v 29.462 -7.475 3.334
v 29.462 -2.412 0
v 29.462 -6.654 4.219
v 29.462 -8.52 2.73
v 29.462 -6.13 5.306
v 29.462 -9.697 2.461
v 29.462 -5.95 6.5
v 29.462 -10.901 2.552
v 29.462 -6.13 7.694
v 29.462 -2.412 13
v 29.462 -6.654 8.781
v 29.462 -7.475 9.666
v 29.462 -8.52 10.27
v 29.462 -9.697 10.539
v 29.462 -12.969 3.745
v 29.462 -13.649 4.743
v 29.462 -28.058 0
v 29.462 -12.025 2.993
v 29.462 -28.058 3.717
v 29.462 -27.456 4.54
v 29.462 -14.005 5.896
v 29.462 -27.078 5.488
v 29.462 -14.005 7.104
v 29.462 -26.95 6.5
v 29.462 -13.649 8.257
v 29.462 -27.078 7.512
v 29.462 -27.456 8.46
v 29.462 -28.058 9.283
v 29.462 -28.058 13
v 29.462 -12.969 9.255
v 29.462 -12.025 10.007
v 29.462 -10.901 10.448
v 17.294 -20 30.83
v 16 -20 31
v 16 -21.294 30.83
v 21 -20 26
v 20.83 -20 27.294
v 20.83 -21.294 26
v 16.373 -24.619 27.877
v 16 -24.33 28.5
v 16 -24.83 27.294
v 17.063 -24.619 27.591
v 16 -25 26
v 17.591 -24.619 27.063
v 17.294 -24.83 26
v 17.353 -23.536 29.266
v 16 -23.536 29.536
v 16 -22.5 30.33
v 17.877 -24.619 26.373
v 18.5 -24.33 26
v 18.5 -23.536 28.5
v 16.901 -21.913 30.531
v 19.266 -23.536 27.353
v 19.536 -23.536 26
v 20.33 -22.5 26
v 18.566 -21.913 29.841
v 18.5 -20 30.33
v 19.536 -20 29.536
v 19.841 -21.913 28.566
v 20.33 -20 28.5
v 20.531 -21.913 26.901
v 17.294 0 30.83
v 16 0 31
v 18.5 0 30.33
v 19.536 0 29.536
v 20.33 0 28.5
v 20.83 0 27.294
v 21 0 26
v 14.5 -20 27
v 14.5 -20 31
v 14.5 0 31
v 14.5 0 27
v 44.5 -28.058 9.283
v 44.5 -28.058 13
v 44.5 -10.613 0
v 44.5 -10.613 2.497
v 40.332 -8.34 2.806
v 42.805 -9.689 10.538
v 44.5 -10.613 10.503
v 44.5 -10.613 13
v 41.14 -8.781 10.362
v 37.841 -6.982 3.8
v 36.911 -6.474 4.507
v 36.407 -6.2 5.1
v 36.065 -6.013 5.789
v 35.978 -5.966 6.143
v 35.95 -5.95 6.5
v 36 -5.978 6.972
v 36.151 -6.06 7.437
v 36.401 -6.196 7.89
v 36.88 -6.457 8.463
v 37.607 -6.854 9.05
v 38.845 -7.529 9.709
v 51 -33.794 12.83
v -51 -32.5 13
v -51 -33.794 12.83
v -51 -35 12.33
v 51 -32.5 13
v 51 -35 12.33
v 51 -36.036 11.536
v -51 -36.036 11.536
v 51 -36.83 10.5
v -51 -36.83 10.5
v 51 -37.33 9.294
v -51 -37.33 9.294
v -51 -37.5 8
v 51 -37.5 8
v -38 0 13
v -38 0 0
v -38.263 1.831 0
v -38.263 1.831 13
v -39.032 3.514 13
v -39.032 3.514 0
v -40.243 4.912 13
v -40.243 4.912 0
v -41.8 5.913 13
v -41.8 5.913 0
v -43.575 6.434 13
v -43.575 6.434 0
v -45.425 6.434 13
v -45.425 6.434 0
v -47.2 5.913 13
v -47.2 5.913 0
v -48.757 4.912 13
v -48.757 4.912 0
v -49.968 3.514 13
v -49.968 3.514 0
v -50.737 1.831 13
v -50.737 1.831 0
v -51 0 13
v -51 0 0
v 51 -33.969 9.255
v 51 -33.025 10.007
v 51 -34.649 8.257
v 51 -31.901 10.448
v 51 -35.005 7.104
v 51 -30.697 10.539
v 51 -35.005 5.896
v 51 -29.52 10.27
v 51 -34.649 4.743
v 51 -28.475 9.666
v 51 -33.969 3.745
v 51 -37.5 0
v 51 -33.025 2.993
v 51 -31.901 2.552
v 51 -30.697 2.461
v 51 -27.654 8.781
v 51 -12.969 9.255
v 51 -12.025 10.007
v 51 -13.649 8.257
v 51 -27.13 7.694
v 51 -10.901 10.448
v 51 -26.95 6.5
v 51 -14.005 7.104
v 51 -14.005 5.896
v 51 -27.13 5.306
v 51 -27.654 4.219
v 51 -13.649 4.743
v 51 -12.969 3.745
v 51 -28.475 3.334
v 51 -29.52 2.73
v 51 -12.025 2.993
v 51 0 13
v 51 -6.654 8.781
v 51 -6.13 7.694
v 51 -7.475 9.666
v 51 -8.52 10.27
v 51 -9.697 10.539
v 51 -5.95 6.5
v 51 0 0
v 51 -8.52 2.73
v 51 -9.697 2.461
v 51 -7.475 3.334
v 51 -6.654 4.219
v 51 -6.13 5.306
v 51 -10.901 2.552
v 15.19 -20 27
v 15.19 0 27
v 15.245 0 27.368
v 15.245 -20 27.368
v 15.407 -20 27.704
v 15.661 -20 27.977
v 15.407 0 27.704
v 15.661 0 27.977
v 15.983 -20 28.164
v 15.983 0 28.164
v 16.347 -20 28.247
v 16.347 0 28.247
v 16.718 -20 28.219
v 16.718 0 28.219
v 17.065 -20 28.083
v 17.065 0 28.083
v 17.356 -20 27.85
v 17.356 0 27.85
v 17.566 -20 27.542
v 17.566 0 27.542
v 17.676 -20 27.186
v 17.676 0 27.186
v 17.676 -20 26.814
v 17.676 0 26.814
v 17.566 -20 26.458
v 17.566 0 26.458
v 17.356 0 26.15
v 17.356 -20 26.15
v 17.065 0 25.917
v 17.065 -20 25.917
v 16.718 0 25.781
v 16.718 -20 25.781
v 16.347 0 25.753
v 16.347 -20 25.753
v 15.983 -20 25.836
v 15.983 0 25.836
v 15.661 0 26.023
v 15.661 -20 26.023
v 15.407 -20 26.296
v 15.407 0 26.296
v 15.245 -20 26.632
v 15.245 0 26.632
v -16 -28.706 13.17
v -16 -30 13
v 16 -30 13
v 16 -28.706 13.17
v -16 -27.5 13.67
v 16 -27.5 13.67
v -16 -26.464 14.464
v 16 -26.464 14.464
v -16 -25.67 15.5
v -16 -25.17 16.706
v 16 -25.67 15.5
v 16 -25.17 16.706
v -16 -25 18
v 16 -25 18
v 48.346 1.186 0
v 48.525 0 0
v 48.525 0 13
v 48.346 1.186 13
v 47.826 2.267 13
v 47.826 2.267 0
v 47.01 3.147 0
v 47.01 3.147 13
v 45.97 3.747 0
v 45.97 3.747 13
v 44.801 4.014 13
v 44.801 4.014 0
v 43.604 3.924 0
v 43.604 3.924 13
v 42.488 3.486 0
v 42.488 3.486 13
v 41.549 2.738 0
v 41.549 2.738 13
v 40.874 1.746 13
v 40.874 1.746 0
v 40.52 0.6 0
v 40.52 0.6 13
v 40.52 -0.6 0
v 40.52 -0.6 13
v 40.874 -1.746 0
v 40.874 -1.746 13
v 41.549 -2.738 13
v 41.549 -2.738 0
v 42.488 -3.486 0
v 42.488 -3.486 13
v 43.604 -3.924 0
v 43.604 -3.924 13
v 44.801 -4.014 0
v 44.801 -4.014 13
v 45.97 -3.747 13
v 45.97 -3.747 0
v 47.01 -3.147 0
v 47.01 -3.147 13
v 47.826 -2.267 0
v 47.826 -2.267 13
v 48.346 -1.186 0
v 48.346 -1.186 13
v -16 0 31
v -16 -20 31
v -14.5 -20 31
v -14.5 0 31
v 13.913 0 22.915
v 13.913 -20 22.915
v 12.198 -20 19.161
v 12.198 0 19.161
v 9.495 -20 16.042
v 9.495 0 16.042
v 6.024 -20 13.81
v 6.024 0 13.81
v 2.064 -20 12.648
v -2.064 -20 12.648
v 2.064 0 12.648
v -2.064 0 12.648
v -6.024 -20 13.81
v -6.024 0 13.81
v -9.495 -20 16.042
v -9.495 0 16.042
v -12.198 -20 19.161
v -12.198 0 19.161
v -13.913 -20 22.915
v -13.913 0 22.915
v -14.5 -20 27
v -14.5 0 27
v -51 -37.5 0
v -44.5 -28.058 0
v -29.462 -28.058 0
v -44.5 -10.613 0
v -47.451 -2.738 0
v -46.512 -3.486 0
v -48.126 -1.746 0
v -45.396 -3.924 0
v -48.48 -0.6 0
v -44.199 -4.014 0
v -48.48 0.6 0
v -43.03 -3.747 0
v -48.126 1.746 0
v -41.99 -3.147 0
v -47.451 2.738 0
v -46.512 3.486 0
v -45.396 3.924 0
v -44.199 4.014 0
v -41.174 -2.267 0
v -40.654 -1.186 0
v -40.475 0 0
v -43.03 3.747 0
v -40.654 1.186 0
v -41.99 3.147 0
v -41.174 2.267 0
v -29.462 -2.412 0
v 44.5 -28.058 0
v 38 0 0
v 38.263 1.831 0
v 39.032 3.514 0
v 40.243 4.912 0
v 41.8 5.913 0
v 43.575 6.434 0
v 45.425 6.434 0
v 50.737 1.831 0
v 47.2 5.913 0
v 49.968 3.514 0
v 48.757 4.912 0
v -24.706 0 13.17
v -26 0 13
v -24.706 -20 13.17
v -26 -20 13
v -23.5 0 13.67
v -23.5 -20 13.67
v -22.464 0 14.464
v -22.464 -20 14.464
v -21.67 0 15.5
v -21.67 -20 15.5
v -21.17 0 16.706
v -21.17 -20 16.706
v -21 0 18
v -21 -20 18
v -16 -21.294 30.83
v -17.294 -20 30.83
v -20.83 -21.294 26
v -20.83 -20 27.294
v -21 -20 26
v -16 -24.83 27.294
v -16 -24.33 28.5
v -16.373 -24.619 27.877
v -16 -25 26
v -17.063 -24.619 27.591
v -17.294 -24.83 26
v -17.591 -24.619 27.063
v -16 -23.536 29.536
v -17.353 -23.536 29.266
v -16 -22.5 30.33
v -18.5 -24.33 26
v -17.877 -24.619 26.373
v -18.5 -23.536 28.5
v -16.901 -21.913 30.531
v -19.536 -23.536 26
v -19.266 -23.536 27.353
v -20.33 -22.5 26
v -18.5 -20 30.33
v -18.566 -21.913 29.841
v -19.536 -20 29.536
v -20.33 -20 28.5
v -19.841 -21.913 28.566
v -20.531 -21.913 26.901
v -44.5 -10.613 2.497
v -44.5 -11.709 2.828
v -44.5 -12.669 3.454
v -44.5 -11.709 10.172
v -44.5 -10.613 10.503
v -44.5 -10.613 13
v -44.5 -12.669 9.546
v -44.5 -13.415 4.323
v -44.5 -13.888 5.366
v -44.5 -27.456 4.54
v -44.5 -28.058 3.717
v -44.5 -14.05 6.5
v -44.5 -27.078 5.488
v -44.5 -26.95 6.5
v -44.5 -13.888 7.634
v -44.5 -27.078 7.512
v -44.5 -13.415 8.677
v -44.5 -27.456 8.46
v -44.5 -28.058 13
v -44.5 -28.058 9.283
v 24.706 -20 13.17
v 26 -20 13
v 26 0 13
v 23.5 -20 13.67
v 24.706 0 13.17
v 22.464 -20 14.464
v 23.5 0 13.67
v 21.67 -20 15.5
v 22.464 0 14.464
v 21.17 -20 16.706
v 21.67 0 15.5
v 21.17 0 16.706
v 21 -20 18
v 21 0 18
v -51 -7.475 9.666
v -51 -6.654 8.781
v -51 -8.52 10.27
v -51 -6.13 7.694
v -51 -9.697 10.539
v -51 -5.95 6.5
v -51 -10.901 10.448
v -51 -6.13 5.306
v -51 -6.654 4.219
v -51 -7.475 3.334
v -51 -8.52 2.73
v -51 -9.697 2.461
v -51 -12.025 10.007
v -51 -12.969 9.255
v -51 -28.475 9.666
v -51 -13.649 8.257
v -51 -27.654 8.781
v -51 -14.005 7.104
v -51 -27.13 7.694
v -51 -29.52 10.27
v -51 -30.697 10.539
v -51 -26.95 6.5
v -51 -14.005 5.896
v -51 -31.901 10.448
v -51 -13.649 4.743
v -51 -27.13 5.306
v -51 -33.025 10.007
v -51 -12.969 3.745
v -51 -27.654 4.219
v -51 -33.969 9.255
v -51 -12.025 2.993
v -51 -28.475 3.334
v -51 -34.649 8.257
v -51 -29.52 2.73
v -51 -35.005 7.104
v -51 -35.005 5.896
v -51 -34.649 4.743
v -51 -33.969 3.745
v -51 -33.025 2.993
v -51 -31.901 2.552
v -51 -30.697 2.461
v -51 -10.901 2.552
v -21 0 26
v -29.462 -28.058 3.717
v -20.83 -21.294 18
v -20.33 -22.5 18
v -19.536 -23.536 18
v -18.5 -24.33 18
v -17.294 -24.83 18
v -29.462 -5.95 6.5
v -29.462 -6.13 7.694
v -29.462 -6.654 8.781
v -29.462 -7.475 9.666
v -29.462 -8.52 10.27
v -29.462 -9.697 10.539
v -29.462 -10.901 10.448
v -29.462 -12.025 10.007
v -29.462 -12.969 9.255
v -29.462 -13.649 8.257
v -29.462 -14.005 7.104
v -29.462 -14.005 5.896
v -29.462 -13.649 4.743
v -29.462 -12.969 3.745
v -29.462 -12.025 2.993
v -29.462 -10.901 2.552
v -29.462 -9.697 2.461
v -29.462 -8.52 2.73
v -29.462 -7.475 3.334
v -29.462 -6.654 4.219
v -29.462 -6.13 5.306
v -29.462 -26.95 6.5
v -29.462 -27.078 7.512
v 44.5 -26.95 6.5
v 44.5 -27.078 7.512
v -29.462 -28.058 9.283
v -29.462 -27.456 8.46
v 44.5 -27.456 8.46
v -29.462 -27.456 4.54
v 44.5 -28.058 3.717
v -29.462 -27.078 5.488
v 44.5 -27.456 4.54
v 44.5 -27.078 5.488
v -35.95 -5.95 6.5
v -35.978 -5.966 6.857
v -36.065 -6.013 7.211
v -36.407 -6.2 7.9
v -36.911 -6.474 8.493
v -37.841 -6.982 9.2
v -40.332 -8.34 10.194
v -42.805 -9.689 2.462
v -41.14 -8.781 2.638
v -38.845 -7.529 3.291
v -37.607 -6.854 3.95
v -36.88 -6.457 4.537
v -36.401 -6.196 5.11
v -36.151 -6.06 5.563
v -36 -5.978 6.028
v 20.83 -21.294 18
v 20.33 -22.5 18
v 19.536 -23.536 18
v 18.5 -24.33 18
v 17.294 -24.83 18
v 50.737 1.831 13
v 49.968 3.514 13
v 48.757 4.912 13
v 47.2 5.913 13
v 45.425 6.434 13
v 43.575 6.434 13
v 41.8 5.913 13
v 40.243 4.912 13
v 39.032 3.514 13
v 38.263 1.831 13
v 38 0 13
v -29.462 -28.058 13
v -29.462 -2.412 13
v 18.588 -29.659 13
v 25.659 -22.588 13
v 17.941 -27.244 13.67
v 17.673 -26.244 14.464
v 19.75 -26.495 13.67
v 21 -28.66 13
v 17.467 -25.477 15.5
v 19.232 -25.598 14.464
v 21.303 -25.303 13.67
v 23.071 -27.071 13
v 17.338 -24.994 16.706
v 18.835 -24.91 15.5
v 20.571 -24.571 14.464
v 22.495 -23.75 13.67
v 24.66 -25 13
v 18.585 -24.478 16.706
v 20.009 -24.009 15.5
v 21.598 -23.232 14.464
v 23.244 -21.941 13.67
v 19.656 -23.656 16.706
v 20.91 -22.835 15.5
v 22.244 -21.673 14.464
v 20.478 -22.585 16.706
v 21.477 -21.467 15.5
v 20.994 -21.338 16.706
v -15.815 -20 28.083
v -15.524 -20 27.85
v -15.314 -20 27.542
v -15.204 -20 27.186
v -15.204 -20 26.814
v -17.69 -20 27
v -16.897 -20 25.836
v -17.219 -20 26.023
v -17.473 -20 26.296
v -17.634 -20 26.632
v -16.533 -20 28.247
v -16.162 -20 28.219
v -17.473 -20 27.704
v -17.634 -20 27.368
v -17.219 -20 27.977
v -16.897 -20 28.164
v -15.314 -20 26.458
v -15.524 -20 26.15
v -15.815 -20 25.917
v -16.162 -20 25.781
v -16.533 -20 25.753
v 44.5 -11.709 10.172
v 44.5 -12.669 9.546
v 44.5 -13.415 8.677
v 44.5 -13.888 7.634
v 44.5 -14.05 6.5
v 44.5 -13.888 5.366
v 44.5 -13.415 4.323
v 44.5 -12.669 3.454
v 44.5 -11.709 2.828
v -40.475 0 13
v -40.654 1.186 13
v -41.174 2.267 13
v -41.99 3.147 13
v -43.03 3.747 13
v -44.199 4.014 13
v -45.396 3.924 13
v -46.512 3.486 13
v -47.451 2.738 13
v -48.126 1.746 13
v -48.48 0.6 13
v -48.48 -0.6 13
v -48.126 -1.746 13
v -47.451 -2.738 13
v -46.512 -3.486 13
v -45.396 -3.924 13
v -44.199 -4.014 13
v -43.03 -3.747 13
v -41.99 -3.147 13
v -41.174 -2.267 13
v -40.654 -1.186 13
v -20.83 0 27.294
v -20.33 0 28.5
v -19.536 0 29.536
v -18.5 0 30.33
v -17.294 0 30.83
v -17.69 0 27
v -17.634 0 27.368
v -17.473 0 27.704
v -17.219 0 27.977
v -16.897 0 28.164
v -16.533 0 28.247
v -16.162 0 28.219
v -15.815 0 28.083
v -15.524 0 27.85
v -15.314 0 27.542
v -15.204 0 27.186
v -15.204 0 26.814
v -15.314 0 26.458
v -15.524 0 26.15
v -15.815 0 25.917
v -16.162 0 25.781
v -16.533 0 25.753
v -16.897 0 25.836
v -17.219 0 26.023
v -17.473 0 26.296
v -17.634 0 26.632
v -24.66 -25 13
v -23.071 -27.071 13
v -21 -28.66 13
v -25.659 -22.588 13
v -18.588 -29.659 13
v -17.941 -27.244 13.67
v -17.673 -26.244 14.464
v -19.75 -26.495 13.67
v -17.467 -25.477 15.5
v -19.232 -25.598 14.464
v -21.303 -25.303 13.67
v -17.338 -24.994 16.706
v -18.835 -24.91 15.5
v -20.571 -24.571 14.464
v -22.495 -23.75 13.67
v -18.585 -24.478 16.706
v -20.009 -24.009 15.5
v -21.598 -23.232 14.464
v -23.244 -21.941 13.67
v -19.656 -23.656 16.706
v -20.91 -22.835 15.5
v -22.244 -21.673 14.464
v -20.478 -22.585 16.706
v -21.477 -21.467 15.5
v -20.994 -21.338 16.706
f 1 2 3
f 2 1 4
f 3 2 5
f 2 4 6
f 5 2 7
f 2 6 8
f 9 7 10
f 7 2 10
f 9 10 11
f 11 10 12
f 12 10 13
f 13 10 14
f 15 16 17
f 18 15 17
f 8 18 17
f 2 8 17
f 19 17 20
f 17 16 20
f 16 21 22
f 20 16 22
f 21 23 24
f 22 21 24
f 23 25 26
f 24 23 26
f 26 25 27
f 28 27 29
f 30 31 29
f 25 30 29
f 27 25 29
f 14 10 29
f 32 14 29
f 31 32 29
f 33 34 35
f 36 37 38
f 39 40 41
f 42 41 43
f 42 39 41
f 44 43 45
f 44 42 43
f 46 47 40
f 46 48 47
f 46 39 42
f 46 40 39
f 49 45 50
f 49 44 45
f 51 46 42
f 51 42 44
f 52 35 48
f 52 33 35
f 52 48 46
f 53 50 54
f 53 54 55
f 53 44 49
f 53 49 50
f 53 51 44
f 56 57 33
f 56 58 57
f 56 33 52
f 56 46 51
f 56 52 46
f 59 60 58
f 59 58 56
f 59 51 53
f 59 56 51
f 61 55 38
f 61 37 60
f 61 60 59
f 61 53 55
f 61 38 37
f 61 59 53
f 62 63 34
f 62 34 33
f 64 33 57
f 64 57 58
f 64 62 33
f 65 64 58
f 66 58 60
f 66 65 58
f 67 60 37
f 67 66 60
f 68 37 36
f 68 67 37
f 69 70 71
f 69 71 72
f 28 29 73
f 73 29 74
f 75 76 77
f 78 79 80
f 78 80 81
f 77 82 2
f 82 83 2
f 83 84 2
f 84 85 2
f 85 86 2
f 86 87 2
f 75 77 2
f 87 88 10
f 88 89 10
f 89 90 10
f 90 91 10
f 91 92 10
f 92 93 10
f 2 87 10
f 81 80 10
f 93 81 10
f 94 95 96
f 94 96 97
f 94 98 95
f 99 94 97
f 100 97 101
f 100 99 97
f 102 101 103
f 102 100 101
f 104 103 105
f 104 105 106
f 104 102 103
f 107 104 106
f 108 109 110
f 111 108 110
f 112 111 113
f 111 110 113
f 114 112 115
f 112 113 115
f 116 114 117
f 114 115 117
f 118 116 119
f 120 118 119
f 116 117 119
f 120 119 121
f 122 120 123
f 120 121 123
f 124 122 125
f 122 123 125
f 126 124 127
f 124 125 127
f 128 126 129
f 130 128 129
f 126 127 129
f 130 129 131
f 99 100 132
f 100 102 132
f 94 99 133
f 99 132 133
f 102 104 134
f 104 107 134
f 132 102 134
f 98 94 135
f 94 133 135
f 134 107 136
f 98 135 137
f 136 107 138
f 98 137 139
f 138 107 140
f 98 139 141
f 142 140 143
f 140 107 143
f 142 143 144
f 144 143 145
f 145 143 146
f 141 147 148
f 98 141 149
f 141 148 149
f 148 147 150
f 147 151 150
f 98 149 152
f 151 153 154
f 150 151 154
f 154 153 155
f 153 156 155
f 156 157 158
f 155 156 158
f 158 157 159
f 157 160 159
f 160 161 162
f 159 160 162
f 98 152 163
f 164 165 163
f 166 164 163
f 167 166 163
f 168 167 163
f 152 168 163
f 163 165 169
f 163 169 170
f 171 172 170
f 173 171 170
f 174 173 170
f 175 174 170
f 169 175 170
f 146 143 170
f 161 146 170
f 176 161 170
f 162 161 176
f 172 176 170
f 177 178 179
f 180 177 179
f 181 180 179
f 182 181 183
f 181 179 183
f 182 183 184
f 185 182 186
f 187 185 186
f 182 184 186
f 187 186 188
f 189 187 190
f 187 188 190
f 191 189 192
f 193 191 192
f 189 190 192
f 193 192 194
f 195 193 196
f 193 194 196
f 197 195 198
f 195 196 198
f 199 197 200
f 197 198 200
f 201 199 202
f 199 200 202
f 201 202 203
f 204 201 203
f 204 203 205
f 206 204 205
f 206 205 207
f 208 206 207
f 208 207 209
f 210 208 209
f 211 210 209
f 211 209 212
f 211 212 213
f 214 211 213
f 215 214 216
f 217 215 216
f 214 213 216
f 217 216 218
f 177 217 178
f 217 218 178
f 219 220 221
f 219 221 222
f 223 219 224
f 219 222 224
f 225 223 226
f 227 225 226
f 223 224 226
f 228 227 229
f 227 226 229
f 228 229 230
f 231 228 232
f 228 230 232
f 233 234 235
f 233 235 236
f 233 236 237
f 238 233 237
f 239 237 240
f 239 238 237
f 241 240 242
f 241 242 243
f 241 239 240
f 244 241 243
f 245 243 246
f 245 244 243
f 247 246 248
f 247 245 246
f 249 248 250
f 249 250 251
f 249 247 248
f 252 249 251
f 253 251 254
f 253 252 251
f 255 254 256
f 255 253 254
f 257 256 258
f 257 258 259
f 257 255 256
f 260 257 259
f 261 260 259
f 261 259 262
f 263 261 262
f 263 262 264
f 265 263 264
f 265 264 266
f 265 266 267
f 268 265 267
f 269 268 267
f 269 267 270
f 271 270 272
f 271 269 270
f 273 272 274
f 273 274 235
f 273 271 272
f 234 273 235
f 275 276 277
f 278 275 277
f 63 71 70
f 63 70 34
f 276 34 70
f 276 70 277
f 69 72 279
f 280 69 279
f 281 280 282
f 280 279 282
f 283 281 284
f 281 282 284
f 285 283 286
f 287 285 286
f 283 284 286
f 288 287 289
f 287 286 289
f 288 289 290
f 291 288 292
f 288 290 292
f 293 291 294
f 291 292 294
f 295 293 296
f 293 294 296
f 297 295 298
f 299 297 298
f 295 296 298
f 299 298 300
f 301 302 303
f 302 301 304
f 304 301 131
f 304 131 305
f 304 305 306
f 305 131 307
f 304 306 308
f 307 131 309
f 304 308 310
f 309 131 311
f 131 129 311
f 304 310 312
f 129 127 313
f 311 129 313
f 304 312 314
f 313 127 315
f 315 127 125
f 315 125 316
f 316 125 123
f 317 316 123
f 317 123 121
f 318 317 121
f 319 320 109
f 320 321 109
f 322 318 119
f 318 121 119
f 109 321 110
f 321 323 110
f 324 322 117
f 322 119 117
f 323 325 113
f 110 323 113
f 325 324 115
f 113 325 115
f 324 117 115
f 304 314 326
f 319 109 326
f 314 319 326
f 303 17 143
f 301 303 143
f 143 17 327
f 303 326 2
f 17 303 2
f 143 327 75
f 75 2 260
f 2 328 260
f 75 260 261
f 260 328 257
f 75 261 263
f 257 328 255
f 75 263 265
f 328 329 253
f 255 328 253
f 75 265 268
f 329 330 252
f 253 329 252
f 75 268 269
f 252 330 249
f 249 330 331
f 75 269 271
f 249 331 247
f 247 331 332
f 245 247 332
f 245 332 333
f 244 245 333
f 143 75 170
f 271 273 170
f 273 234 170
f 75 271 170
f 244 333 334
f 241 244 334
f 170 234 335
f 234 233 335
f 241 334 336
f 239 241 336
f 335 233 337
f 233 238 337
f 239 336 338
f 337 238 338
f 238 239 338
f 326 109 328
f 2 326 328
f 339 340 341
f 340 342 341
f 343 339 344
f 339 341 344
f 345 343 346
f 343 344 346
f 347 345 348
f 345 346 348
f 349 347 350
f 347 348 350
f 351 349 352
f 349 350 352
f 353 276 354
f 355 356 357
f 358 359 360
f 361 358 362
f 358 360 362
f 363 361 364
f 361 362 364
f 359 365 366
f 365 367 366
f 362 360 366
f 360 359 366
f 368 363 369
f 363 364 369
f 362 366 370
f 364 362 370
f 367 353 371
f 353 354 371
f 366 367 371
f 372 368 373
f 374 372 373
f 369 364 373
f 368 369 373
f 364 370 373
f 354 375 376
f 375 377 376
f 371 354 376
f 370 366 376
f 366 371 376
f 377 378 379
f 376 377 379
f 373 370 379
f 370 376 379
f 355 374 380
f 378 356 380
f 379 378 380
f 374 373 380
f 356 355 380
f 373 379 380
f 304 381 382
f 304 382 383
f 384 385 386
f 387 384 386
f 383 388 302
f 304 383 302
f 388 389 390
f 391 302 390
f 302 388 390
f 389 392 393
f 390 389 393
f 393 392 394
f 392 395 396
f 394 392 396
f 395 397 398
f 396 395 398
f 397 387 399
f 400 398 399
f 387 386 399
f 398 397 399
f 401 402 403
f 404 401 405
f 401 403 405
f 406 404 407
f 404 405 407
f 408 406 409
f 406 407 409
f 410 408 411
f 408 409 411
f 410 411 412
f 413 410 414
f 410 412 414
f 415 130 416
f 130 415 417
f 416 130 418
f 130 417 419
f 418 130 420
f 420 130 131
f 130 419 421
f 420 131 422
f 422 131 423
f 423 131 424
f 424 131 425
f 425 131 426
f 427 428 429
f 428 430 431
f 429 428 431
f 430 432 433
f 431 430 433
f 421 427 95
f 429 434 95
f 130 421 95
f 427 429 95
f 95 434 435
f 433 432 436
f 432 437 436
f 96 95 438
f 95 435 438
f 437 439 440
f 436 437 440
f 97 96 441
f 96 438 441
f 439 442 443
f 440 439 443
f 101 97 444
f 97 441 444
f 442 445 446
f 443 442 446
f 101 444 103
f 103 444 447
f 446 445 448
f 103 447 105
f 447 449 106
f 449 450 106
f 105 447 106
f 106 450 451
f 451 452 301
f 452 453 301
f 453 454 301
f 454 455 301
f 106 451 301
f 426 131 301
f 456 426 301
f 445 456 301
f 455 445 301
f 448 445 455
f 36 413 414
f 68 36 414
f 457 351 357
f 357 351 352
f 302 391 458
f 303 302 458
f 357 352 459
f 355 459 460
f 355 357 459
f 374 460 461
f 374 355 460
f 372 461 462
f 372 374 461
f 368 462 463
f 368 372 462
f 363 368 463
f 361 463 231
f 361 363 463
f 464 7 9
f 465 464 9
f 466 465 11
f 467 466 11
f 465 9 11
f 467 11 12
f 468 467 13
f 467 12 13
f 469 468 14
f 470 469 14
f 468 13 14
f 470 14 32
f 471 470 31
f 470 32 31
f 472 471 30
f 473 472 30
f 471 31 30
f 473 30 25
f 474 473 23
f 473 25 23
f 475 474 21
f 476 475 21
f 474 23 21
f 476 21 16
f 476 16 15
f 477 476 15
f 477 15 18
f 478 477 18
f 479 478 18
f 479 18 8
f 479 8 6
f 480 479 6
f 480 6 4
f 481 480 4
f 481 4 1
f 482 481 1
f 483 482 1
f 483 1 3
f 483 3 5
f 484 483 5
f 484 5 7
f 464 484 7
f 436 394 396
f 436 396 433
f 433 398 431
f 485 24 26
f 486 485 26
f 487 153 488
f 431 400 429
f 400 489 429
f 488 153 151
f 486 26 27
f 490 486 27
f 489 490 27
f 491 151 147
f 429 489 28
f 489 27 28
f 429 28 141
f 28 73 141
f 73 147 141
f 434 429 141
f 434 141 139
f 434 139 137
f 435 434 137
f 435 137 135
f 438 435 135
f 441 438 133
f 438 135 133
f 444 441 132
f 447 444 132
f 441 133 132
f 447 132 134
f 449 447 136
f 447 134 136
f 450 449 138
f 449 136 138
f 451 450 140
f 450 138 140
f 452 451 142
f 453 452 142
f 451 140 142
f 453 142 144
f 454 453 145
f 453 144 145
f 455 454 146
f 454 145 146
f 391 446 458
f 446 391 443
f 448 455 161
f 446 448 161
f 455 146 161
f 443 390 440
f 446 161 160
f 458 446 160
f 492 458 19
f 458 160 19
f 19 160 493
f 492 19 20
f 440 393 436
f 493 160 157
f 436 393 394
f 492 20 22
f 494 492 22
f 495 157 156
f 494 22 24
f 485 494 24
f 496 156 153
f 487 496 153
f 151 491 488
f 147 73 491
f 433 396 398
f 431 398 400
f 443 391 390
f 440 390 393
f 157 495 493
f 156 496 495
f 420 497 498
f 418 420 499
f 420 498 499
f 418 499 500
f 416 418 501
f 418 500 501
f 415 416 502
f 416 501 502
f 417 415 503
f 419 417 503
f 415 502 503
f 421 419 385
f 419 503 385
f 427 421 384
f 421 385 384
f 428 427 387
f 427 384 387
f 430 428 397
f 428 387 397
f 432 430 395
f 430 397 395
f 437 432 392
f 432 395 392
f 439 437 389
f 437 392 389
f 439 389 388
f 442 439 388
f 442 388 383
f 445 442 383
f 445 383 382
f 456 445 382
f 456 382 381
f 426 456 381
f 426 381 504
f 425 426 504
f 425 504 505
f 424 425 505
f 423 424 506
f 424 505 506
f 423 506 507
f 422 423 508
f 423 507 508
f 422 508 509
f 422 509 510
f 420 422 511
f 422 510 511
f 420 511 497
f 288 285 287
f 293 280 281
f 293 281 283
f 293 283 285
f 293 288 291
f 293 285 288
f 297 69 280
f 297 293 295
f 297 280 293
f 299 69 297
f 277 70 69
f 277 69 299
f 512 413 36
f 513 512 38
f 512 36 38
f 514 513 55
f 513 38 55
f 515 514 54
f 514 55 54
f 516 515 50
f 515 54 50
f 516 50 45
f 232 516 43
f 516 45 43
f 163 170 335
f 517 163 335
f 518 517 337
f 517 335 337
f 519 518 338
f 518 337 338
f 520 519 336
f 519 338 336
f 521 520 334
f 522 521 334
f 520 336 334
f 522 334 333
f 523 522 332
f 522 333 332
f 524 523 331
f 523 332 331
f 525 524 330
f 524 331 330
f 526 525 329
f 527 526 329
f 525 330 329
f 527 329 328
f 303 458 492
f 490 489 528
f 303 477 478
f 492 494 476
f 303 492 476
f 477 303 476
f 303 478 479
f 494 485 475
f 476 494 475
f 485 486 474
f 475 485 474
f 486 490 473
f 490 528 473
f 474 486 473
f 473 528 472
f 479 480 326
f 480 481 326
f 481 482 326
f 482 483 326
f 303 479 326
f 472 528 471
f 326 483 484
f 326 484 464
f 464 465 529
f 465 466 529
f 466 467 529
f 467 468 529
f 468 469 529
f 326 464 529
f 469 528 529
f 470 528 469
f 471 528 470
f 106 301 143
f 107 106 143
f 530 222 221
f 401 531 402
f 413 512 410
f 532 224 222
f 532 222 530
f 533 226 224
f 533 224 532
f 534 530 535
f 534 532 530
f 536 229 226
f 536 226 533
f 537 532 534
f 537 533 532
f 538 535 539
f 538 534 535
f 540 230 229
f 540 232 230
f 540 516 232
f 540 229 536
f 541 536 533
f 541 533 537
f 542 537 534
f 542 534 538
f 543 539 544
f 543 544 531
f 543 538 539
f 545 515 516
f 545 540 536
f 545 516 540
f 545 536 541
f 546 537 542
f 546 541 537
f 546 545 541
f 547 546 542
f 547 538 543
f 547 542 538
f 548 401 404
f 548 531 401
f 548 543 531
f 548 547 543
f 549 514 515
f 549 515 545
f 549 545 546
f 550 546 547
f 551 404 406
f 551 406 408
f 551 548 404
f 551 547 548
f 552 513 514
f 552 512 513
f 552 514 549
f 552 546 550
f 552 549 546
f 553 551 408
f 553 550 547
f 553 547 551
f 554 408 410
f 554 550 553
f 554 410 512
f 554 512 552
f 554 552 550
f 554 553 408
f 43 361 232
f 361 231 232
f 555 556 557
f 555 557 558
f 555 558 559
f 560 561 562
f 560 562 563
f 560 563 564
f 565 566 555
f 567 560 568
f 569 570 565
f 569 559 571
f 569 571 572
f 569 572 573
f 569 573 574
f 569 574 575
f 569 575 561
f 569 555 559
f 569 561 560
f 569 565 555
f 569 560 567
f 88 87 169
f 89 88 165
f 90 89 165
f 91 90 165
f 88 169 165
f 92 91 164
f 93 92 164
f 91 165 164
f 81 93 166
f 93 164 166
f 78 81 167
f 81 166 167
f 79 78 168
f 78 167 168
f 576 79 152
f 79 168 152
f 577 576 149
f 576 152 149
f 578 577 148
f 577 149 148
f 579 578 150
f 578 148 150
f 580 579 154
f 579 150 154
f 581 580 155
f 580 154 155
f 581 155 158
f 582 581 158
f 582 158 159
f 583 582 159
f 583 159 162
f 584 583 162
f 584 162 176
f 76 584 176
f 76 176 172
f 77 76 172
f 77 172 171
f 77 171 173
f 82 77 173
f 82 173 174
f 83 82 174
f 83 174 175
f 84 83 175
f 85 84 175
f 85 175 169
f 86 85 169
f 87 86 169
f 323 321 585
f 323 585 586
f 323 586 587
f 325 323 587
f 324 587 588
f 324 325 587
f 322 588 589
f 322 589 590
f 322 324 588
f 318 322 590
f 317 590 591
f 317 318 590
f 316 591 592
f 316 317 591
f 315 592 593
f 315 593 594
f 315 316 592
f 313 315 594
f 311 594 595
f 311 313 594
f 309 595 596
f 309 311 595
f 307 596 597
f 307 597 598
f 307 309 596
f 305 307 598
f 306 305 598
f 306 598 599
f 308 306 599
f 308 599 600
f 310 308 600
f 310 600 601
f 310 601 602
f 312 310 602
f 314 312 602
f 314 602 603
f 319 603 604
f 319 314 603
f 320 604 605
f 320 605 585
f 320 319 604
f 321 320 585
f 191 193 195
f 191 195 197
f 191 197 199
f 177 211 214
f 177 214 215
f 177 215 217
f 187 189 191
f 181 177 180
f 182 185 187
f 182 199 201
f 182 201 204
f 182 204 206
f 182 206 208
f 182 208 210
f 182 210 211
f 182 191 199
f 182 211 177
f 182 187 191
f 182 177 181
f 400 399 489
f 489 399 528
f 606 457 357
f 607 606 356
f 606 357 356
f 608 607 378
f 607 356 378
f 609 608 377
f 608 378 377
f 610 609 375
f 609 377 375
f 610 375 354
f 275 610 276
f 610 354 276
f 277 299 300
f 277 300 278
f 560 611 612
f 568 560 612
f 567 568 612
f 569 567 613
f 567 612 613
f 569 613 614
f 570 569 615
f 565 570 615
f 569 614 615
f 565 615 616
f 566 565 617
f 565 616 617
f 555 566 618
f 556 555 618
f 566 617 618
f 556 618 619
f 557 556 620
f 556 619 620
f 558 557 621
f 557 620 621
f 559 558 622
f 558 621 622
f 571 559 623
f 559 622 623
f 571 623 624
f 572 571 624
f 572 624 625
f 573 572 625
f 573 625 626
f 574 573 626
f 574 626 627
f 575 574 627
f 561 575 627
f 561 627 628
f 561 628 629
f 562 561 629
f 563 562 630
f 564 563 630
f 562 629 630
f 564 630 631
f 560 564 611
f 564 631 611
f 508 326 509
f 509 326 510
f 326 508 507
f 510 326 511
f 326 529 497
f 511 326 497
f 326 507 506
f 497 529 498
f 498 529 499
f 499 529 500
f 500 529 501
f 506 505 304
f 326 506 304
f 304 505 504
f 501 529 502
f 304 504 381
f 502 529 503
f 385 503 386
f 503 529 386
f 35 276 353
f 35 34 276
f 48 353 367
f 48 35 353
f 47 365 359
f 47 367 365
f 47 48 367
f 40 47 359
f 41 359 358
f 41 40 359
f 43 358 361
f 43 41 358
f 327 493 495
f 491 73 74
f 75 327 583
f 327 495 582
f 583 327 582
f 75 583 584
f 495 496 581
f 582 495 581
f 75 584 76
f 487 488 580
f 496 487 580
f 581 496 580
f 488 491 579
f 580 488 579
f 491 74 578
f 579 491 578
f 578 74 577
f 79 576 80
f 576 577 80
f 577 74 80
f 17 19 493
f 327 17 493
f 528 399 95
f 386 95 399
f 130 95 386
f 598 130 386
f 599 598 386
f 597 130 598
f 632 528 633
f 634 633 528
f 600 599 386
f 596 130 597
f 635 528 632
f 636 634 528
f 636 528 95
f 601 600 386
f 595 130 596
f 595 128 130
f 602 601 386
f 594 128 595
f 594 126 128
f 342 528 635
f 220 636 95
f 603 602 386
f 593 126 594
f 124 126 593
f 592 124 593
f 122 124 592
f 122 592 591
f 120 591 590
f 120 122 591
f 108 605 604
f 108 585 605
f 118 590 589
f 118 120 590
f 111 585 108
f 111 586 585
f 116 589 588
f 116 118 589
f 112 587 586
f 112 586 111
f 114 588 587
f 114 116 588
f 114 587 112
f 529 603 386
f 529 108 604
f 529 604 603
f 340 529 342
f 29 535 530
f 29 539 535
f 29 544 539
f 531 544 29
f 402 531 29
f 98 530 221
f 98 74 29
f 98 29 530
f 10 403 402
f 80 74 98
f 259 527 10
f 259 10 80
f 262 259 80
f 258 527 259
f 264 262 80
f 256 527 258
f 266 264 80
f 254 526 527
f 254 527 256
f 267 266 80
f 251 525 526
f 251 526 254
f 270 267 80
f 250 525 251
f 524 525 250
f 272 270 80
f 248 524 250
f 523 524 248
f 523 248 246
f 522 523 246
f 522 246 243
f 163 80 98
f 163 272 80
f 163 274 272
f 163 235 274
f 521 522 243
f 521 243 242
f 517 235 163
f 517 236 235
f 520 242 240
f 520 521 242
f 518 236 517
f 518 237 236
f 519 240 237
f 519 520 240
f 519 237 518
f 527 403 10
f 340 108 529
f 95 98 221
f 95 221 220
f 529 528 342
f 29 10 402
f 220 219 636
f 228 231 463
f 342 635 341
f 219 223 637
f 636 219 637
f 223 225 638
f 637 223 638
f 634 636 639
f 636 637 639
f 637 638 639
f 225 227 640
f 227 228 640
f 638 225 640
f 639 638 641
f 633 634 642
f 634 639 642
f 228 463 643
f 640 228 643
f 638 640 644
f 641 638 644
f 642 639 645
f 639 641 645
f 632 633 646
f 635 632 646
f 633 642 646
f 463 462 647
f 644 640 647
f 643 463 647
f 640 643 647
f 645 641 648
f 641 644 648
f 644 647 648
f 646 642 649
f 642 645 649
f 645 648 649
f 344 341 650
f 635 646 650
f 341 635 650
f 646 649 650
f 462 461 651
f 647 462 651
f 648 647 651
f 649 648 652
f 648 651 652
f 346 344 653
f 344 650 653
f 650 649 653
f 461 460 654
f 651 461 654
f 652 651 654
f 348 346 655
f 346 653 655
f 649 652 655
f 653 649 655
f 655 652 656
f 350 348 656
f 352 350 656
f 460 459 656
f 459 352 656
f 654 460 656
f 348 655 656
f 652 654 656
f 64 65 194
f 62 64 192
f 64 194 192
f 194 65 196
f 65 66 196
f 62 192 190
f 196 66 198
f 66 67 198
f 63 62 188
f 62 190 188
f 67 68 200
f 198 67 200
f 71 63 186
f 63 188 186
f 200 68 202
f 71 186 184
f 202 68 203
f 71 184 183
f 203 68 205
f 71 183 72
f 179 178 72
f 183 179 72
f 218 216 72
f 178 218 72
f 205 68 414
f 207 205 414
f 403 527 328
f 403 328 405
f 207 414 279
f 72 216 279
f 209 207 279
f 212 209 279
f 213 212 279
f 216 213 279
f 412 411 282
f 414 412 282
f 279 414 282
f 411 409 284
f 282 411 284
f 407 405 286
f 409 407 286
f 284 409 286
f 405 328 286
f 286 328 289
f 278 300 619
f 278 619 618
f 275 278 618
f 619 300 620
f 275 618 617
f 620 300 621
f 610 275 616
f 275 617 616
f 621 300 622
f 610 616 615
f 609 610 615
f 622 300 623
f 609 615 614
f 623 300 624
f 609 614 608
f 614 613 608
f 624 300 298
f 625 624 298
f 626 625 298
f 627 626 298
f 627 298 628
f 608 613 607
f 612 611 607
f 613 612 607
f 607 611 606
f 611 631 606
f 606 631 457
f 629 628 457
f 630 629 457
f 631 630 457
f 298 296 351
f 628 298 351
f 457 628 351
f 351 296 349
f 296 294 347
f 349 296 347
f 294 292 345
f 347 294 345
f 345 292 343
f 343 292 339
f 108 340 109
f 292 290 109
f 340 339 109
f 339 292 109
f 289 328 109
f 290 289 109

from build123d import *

# Parameters (mm, degrees)
F0_R      = 4.025
F1_DEPTH  = 13
F2_R      = 4.05
F3_DEPTH  = 120
F5_DEPTH  = 18
F6_R      = 1.25
F7_DEPTH  = 20
F8_R      = 4.99999
F10_DEPTH = 25


# Not quite as in the source:
# - a fillet or chamfer is up to 0.001 mm smaller than in the source, because OpenCascade refuses the exact size


with BuildPart() as f1:
    # F0 (on Top) → F1 (new body)
    with BuildSketch(Plane.XY):
        with BuildLine():
            Line((38, 0), (0, 0))
            Line((0, 0), (-38, 0))
            ThreePointArc((-38, 0), (-44.5, 6.5), (-51, 0))
            Line((-51, 0), (-51, -37.5))
            Line((-51, -37.5), (0, -37.5))
            Line((0, -37.5), (51, -37.5))
            Line((51, -37.5), (51, 0))
            ThreePointArc((51, 0), (44.5, 6.5), (38, 0))
        make_face()
        with Locations((-44.5, 0)):
            Circle(F0_R, mode=Mode.SUBTRACT)
        with Locations((44.5, 0)):
            Circle(F0_R, mode=Mode.SUBTRACT)
    extrude(amount=F1_DEPTH)

    # F2 (on face) → F3 (cut)
    with BuildSketch(Plane.YZ.offset(51)):
        with Locations((-31, 6.5)):
            Circle(F2_R)
        with Locations((-10, 6.5)):
            Circle(F2_R)
    extrude(amount=-F3_DEPTH, mode=Mode.SUBTRACT)

    # F4 (on face) → F5 (join)
    with BuildSketch(Plane.XY.offset(13)):
        Polygon((-21, -25), (0, -25), (21, -25), (21, 0), (-21, 0), align=None)
    extrude(amount=F5_DEPTH)

    # F6 (on face) → F7 (cut)
    with BuildSketch(Plane(origin=(0, 0, 0), x_dir=(-1, 0, 0), z_dir=(0, 1, 0))):
        with BuildLine():
            Line((-14.5, 31), (-14.5, 27))
            ThreePointArc((-14.5, 27), (0, 12.5), (14.5, 27))
            Line((14.5, 27), (14.5, 31))
            Line((14.5, 31), (-14.5, 31))
        make_face()
        with Locations((-16.4399370551, 27)):
            Circle(F6_R)
        with Locations((16.4399370551, 27)):
            Circle(F6_R)
    extrude(amount=-F7_DEPTH, mode=Mode.SUBTRACT)

    # F8 (radius 5 in the source; OpenCascade refuses exactly that, so slightly less here)
    f8_edges = [f1.edges().sort_by_distance(p)[0] for p in [
        (21, -12.5, 31),
        (-21, -12.5, 31),
        (21, -12.5, 13),
        (-21, -12.5, 13),
        (0, -25, 31),
        (21, -25, 22),
        (-21, -25, 22),
        (0, -37.5, 13),
        (0, -25, 13),
    ]]
    fillet(f8_edges, radius=F8_R)

    # F9 (on face) → F10 (cut)
    with BuildSketch(Plane.XY.offset(13)):
        Polygon((44.5, -28.0575975776), (44.5, -10.6131481007), (29.4615291059, -2.4116530549), (29.4615291059, -28.0575975776), align=None)
        Polygon((-29.4615291059, -2.4116530549), (-44.5, -10.6131481007), (-44.5, -28.0575975776), (-29.4615291059, -28.0575975776), align=None)
    extrude(amount=-F10_DEPTH, mode=Mode.SUBTRACT)


solid = f1.part
